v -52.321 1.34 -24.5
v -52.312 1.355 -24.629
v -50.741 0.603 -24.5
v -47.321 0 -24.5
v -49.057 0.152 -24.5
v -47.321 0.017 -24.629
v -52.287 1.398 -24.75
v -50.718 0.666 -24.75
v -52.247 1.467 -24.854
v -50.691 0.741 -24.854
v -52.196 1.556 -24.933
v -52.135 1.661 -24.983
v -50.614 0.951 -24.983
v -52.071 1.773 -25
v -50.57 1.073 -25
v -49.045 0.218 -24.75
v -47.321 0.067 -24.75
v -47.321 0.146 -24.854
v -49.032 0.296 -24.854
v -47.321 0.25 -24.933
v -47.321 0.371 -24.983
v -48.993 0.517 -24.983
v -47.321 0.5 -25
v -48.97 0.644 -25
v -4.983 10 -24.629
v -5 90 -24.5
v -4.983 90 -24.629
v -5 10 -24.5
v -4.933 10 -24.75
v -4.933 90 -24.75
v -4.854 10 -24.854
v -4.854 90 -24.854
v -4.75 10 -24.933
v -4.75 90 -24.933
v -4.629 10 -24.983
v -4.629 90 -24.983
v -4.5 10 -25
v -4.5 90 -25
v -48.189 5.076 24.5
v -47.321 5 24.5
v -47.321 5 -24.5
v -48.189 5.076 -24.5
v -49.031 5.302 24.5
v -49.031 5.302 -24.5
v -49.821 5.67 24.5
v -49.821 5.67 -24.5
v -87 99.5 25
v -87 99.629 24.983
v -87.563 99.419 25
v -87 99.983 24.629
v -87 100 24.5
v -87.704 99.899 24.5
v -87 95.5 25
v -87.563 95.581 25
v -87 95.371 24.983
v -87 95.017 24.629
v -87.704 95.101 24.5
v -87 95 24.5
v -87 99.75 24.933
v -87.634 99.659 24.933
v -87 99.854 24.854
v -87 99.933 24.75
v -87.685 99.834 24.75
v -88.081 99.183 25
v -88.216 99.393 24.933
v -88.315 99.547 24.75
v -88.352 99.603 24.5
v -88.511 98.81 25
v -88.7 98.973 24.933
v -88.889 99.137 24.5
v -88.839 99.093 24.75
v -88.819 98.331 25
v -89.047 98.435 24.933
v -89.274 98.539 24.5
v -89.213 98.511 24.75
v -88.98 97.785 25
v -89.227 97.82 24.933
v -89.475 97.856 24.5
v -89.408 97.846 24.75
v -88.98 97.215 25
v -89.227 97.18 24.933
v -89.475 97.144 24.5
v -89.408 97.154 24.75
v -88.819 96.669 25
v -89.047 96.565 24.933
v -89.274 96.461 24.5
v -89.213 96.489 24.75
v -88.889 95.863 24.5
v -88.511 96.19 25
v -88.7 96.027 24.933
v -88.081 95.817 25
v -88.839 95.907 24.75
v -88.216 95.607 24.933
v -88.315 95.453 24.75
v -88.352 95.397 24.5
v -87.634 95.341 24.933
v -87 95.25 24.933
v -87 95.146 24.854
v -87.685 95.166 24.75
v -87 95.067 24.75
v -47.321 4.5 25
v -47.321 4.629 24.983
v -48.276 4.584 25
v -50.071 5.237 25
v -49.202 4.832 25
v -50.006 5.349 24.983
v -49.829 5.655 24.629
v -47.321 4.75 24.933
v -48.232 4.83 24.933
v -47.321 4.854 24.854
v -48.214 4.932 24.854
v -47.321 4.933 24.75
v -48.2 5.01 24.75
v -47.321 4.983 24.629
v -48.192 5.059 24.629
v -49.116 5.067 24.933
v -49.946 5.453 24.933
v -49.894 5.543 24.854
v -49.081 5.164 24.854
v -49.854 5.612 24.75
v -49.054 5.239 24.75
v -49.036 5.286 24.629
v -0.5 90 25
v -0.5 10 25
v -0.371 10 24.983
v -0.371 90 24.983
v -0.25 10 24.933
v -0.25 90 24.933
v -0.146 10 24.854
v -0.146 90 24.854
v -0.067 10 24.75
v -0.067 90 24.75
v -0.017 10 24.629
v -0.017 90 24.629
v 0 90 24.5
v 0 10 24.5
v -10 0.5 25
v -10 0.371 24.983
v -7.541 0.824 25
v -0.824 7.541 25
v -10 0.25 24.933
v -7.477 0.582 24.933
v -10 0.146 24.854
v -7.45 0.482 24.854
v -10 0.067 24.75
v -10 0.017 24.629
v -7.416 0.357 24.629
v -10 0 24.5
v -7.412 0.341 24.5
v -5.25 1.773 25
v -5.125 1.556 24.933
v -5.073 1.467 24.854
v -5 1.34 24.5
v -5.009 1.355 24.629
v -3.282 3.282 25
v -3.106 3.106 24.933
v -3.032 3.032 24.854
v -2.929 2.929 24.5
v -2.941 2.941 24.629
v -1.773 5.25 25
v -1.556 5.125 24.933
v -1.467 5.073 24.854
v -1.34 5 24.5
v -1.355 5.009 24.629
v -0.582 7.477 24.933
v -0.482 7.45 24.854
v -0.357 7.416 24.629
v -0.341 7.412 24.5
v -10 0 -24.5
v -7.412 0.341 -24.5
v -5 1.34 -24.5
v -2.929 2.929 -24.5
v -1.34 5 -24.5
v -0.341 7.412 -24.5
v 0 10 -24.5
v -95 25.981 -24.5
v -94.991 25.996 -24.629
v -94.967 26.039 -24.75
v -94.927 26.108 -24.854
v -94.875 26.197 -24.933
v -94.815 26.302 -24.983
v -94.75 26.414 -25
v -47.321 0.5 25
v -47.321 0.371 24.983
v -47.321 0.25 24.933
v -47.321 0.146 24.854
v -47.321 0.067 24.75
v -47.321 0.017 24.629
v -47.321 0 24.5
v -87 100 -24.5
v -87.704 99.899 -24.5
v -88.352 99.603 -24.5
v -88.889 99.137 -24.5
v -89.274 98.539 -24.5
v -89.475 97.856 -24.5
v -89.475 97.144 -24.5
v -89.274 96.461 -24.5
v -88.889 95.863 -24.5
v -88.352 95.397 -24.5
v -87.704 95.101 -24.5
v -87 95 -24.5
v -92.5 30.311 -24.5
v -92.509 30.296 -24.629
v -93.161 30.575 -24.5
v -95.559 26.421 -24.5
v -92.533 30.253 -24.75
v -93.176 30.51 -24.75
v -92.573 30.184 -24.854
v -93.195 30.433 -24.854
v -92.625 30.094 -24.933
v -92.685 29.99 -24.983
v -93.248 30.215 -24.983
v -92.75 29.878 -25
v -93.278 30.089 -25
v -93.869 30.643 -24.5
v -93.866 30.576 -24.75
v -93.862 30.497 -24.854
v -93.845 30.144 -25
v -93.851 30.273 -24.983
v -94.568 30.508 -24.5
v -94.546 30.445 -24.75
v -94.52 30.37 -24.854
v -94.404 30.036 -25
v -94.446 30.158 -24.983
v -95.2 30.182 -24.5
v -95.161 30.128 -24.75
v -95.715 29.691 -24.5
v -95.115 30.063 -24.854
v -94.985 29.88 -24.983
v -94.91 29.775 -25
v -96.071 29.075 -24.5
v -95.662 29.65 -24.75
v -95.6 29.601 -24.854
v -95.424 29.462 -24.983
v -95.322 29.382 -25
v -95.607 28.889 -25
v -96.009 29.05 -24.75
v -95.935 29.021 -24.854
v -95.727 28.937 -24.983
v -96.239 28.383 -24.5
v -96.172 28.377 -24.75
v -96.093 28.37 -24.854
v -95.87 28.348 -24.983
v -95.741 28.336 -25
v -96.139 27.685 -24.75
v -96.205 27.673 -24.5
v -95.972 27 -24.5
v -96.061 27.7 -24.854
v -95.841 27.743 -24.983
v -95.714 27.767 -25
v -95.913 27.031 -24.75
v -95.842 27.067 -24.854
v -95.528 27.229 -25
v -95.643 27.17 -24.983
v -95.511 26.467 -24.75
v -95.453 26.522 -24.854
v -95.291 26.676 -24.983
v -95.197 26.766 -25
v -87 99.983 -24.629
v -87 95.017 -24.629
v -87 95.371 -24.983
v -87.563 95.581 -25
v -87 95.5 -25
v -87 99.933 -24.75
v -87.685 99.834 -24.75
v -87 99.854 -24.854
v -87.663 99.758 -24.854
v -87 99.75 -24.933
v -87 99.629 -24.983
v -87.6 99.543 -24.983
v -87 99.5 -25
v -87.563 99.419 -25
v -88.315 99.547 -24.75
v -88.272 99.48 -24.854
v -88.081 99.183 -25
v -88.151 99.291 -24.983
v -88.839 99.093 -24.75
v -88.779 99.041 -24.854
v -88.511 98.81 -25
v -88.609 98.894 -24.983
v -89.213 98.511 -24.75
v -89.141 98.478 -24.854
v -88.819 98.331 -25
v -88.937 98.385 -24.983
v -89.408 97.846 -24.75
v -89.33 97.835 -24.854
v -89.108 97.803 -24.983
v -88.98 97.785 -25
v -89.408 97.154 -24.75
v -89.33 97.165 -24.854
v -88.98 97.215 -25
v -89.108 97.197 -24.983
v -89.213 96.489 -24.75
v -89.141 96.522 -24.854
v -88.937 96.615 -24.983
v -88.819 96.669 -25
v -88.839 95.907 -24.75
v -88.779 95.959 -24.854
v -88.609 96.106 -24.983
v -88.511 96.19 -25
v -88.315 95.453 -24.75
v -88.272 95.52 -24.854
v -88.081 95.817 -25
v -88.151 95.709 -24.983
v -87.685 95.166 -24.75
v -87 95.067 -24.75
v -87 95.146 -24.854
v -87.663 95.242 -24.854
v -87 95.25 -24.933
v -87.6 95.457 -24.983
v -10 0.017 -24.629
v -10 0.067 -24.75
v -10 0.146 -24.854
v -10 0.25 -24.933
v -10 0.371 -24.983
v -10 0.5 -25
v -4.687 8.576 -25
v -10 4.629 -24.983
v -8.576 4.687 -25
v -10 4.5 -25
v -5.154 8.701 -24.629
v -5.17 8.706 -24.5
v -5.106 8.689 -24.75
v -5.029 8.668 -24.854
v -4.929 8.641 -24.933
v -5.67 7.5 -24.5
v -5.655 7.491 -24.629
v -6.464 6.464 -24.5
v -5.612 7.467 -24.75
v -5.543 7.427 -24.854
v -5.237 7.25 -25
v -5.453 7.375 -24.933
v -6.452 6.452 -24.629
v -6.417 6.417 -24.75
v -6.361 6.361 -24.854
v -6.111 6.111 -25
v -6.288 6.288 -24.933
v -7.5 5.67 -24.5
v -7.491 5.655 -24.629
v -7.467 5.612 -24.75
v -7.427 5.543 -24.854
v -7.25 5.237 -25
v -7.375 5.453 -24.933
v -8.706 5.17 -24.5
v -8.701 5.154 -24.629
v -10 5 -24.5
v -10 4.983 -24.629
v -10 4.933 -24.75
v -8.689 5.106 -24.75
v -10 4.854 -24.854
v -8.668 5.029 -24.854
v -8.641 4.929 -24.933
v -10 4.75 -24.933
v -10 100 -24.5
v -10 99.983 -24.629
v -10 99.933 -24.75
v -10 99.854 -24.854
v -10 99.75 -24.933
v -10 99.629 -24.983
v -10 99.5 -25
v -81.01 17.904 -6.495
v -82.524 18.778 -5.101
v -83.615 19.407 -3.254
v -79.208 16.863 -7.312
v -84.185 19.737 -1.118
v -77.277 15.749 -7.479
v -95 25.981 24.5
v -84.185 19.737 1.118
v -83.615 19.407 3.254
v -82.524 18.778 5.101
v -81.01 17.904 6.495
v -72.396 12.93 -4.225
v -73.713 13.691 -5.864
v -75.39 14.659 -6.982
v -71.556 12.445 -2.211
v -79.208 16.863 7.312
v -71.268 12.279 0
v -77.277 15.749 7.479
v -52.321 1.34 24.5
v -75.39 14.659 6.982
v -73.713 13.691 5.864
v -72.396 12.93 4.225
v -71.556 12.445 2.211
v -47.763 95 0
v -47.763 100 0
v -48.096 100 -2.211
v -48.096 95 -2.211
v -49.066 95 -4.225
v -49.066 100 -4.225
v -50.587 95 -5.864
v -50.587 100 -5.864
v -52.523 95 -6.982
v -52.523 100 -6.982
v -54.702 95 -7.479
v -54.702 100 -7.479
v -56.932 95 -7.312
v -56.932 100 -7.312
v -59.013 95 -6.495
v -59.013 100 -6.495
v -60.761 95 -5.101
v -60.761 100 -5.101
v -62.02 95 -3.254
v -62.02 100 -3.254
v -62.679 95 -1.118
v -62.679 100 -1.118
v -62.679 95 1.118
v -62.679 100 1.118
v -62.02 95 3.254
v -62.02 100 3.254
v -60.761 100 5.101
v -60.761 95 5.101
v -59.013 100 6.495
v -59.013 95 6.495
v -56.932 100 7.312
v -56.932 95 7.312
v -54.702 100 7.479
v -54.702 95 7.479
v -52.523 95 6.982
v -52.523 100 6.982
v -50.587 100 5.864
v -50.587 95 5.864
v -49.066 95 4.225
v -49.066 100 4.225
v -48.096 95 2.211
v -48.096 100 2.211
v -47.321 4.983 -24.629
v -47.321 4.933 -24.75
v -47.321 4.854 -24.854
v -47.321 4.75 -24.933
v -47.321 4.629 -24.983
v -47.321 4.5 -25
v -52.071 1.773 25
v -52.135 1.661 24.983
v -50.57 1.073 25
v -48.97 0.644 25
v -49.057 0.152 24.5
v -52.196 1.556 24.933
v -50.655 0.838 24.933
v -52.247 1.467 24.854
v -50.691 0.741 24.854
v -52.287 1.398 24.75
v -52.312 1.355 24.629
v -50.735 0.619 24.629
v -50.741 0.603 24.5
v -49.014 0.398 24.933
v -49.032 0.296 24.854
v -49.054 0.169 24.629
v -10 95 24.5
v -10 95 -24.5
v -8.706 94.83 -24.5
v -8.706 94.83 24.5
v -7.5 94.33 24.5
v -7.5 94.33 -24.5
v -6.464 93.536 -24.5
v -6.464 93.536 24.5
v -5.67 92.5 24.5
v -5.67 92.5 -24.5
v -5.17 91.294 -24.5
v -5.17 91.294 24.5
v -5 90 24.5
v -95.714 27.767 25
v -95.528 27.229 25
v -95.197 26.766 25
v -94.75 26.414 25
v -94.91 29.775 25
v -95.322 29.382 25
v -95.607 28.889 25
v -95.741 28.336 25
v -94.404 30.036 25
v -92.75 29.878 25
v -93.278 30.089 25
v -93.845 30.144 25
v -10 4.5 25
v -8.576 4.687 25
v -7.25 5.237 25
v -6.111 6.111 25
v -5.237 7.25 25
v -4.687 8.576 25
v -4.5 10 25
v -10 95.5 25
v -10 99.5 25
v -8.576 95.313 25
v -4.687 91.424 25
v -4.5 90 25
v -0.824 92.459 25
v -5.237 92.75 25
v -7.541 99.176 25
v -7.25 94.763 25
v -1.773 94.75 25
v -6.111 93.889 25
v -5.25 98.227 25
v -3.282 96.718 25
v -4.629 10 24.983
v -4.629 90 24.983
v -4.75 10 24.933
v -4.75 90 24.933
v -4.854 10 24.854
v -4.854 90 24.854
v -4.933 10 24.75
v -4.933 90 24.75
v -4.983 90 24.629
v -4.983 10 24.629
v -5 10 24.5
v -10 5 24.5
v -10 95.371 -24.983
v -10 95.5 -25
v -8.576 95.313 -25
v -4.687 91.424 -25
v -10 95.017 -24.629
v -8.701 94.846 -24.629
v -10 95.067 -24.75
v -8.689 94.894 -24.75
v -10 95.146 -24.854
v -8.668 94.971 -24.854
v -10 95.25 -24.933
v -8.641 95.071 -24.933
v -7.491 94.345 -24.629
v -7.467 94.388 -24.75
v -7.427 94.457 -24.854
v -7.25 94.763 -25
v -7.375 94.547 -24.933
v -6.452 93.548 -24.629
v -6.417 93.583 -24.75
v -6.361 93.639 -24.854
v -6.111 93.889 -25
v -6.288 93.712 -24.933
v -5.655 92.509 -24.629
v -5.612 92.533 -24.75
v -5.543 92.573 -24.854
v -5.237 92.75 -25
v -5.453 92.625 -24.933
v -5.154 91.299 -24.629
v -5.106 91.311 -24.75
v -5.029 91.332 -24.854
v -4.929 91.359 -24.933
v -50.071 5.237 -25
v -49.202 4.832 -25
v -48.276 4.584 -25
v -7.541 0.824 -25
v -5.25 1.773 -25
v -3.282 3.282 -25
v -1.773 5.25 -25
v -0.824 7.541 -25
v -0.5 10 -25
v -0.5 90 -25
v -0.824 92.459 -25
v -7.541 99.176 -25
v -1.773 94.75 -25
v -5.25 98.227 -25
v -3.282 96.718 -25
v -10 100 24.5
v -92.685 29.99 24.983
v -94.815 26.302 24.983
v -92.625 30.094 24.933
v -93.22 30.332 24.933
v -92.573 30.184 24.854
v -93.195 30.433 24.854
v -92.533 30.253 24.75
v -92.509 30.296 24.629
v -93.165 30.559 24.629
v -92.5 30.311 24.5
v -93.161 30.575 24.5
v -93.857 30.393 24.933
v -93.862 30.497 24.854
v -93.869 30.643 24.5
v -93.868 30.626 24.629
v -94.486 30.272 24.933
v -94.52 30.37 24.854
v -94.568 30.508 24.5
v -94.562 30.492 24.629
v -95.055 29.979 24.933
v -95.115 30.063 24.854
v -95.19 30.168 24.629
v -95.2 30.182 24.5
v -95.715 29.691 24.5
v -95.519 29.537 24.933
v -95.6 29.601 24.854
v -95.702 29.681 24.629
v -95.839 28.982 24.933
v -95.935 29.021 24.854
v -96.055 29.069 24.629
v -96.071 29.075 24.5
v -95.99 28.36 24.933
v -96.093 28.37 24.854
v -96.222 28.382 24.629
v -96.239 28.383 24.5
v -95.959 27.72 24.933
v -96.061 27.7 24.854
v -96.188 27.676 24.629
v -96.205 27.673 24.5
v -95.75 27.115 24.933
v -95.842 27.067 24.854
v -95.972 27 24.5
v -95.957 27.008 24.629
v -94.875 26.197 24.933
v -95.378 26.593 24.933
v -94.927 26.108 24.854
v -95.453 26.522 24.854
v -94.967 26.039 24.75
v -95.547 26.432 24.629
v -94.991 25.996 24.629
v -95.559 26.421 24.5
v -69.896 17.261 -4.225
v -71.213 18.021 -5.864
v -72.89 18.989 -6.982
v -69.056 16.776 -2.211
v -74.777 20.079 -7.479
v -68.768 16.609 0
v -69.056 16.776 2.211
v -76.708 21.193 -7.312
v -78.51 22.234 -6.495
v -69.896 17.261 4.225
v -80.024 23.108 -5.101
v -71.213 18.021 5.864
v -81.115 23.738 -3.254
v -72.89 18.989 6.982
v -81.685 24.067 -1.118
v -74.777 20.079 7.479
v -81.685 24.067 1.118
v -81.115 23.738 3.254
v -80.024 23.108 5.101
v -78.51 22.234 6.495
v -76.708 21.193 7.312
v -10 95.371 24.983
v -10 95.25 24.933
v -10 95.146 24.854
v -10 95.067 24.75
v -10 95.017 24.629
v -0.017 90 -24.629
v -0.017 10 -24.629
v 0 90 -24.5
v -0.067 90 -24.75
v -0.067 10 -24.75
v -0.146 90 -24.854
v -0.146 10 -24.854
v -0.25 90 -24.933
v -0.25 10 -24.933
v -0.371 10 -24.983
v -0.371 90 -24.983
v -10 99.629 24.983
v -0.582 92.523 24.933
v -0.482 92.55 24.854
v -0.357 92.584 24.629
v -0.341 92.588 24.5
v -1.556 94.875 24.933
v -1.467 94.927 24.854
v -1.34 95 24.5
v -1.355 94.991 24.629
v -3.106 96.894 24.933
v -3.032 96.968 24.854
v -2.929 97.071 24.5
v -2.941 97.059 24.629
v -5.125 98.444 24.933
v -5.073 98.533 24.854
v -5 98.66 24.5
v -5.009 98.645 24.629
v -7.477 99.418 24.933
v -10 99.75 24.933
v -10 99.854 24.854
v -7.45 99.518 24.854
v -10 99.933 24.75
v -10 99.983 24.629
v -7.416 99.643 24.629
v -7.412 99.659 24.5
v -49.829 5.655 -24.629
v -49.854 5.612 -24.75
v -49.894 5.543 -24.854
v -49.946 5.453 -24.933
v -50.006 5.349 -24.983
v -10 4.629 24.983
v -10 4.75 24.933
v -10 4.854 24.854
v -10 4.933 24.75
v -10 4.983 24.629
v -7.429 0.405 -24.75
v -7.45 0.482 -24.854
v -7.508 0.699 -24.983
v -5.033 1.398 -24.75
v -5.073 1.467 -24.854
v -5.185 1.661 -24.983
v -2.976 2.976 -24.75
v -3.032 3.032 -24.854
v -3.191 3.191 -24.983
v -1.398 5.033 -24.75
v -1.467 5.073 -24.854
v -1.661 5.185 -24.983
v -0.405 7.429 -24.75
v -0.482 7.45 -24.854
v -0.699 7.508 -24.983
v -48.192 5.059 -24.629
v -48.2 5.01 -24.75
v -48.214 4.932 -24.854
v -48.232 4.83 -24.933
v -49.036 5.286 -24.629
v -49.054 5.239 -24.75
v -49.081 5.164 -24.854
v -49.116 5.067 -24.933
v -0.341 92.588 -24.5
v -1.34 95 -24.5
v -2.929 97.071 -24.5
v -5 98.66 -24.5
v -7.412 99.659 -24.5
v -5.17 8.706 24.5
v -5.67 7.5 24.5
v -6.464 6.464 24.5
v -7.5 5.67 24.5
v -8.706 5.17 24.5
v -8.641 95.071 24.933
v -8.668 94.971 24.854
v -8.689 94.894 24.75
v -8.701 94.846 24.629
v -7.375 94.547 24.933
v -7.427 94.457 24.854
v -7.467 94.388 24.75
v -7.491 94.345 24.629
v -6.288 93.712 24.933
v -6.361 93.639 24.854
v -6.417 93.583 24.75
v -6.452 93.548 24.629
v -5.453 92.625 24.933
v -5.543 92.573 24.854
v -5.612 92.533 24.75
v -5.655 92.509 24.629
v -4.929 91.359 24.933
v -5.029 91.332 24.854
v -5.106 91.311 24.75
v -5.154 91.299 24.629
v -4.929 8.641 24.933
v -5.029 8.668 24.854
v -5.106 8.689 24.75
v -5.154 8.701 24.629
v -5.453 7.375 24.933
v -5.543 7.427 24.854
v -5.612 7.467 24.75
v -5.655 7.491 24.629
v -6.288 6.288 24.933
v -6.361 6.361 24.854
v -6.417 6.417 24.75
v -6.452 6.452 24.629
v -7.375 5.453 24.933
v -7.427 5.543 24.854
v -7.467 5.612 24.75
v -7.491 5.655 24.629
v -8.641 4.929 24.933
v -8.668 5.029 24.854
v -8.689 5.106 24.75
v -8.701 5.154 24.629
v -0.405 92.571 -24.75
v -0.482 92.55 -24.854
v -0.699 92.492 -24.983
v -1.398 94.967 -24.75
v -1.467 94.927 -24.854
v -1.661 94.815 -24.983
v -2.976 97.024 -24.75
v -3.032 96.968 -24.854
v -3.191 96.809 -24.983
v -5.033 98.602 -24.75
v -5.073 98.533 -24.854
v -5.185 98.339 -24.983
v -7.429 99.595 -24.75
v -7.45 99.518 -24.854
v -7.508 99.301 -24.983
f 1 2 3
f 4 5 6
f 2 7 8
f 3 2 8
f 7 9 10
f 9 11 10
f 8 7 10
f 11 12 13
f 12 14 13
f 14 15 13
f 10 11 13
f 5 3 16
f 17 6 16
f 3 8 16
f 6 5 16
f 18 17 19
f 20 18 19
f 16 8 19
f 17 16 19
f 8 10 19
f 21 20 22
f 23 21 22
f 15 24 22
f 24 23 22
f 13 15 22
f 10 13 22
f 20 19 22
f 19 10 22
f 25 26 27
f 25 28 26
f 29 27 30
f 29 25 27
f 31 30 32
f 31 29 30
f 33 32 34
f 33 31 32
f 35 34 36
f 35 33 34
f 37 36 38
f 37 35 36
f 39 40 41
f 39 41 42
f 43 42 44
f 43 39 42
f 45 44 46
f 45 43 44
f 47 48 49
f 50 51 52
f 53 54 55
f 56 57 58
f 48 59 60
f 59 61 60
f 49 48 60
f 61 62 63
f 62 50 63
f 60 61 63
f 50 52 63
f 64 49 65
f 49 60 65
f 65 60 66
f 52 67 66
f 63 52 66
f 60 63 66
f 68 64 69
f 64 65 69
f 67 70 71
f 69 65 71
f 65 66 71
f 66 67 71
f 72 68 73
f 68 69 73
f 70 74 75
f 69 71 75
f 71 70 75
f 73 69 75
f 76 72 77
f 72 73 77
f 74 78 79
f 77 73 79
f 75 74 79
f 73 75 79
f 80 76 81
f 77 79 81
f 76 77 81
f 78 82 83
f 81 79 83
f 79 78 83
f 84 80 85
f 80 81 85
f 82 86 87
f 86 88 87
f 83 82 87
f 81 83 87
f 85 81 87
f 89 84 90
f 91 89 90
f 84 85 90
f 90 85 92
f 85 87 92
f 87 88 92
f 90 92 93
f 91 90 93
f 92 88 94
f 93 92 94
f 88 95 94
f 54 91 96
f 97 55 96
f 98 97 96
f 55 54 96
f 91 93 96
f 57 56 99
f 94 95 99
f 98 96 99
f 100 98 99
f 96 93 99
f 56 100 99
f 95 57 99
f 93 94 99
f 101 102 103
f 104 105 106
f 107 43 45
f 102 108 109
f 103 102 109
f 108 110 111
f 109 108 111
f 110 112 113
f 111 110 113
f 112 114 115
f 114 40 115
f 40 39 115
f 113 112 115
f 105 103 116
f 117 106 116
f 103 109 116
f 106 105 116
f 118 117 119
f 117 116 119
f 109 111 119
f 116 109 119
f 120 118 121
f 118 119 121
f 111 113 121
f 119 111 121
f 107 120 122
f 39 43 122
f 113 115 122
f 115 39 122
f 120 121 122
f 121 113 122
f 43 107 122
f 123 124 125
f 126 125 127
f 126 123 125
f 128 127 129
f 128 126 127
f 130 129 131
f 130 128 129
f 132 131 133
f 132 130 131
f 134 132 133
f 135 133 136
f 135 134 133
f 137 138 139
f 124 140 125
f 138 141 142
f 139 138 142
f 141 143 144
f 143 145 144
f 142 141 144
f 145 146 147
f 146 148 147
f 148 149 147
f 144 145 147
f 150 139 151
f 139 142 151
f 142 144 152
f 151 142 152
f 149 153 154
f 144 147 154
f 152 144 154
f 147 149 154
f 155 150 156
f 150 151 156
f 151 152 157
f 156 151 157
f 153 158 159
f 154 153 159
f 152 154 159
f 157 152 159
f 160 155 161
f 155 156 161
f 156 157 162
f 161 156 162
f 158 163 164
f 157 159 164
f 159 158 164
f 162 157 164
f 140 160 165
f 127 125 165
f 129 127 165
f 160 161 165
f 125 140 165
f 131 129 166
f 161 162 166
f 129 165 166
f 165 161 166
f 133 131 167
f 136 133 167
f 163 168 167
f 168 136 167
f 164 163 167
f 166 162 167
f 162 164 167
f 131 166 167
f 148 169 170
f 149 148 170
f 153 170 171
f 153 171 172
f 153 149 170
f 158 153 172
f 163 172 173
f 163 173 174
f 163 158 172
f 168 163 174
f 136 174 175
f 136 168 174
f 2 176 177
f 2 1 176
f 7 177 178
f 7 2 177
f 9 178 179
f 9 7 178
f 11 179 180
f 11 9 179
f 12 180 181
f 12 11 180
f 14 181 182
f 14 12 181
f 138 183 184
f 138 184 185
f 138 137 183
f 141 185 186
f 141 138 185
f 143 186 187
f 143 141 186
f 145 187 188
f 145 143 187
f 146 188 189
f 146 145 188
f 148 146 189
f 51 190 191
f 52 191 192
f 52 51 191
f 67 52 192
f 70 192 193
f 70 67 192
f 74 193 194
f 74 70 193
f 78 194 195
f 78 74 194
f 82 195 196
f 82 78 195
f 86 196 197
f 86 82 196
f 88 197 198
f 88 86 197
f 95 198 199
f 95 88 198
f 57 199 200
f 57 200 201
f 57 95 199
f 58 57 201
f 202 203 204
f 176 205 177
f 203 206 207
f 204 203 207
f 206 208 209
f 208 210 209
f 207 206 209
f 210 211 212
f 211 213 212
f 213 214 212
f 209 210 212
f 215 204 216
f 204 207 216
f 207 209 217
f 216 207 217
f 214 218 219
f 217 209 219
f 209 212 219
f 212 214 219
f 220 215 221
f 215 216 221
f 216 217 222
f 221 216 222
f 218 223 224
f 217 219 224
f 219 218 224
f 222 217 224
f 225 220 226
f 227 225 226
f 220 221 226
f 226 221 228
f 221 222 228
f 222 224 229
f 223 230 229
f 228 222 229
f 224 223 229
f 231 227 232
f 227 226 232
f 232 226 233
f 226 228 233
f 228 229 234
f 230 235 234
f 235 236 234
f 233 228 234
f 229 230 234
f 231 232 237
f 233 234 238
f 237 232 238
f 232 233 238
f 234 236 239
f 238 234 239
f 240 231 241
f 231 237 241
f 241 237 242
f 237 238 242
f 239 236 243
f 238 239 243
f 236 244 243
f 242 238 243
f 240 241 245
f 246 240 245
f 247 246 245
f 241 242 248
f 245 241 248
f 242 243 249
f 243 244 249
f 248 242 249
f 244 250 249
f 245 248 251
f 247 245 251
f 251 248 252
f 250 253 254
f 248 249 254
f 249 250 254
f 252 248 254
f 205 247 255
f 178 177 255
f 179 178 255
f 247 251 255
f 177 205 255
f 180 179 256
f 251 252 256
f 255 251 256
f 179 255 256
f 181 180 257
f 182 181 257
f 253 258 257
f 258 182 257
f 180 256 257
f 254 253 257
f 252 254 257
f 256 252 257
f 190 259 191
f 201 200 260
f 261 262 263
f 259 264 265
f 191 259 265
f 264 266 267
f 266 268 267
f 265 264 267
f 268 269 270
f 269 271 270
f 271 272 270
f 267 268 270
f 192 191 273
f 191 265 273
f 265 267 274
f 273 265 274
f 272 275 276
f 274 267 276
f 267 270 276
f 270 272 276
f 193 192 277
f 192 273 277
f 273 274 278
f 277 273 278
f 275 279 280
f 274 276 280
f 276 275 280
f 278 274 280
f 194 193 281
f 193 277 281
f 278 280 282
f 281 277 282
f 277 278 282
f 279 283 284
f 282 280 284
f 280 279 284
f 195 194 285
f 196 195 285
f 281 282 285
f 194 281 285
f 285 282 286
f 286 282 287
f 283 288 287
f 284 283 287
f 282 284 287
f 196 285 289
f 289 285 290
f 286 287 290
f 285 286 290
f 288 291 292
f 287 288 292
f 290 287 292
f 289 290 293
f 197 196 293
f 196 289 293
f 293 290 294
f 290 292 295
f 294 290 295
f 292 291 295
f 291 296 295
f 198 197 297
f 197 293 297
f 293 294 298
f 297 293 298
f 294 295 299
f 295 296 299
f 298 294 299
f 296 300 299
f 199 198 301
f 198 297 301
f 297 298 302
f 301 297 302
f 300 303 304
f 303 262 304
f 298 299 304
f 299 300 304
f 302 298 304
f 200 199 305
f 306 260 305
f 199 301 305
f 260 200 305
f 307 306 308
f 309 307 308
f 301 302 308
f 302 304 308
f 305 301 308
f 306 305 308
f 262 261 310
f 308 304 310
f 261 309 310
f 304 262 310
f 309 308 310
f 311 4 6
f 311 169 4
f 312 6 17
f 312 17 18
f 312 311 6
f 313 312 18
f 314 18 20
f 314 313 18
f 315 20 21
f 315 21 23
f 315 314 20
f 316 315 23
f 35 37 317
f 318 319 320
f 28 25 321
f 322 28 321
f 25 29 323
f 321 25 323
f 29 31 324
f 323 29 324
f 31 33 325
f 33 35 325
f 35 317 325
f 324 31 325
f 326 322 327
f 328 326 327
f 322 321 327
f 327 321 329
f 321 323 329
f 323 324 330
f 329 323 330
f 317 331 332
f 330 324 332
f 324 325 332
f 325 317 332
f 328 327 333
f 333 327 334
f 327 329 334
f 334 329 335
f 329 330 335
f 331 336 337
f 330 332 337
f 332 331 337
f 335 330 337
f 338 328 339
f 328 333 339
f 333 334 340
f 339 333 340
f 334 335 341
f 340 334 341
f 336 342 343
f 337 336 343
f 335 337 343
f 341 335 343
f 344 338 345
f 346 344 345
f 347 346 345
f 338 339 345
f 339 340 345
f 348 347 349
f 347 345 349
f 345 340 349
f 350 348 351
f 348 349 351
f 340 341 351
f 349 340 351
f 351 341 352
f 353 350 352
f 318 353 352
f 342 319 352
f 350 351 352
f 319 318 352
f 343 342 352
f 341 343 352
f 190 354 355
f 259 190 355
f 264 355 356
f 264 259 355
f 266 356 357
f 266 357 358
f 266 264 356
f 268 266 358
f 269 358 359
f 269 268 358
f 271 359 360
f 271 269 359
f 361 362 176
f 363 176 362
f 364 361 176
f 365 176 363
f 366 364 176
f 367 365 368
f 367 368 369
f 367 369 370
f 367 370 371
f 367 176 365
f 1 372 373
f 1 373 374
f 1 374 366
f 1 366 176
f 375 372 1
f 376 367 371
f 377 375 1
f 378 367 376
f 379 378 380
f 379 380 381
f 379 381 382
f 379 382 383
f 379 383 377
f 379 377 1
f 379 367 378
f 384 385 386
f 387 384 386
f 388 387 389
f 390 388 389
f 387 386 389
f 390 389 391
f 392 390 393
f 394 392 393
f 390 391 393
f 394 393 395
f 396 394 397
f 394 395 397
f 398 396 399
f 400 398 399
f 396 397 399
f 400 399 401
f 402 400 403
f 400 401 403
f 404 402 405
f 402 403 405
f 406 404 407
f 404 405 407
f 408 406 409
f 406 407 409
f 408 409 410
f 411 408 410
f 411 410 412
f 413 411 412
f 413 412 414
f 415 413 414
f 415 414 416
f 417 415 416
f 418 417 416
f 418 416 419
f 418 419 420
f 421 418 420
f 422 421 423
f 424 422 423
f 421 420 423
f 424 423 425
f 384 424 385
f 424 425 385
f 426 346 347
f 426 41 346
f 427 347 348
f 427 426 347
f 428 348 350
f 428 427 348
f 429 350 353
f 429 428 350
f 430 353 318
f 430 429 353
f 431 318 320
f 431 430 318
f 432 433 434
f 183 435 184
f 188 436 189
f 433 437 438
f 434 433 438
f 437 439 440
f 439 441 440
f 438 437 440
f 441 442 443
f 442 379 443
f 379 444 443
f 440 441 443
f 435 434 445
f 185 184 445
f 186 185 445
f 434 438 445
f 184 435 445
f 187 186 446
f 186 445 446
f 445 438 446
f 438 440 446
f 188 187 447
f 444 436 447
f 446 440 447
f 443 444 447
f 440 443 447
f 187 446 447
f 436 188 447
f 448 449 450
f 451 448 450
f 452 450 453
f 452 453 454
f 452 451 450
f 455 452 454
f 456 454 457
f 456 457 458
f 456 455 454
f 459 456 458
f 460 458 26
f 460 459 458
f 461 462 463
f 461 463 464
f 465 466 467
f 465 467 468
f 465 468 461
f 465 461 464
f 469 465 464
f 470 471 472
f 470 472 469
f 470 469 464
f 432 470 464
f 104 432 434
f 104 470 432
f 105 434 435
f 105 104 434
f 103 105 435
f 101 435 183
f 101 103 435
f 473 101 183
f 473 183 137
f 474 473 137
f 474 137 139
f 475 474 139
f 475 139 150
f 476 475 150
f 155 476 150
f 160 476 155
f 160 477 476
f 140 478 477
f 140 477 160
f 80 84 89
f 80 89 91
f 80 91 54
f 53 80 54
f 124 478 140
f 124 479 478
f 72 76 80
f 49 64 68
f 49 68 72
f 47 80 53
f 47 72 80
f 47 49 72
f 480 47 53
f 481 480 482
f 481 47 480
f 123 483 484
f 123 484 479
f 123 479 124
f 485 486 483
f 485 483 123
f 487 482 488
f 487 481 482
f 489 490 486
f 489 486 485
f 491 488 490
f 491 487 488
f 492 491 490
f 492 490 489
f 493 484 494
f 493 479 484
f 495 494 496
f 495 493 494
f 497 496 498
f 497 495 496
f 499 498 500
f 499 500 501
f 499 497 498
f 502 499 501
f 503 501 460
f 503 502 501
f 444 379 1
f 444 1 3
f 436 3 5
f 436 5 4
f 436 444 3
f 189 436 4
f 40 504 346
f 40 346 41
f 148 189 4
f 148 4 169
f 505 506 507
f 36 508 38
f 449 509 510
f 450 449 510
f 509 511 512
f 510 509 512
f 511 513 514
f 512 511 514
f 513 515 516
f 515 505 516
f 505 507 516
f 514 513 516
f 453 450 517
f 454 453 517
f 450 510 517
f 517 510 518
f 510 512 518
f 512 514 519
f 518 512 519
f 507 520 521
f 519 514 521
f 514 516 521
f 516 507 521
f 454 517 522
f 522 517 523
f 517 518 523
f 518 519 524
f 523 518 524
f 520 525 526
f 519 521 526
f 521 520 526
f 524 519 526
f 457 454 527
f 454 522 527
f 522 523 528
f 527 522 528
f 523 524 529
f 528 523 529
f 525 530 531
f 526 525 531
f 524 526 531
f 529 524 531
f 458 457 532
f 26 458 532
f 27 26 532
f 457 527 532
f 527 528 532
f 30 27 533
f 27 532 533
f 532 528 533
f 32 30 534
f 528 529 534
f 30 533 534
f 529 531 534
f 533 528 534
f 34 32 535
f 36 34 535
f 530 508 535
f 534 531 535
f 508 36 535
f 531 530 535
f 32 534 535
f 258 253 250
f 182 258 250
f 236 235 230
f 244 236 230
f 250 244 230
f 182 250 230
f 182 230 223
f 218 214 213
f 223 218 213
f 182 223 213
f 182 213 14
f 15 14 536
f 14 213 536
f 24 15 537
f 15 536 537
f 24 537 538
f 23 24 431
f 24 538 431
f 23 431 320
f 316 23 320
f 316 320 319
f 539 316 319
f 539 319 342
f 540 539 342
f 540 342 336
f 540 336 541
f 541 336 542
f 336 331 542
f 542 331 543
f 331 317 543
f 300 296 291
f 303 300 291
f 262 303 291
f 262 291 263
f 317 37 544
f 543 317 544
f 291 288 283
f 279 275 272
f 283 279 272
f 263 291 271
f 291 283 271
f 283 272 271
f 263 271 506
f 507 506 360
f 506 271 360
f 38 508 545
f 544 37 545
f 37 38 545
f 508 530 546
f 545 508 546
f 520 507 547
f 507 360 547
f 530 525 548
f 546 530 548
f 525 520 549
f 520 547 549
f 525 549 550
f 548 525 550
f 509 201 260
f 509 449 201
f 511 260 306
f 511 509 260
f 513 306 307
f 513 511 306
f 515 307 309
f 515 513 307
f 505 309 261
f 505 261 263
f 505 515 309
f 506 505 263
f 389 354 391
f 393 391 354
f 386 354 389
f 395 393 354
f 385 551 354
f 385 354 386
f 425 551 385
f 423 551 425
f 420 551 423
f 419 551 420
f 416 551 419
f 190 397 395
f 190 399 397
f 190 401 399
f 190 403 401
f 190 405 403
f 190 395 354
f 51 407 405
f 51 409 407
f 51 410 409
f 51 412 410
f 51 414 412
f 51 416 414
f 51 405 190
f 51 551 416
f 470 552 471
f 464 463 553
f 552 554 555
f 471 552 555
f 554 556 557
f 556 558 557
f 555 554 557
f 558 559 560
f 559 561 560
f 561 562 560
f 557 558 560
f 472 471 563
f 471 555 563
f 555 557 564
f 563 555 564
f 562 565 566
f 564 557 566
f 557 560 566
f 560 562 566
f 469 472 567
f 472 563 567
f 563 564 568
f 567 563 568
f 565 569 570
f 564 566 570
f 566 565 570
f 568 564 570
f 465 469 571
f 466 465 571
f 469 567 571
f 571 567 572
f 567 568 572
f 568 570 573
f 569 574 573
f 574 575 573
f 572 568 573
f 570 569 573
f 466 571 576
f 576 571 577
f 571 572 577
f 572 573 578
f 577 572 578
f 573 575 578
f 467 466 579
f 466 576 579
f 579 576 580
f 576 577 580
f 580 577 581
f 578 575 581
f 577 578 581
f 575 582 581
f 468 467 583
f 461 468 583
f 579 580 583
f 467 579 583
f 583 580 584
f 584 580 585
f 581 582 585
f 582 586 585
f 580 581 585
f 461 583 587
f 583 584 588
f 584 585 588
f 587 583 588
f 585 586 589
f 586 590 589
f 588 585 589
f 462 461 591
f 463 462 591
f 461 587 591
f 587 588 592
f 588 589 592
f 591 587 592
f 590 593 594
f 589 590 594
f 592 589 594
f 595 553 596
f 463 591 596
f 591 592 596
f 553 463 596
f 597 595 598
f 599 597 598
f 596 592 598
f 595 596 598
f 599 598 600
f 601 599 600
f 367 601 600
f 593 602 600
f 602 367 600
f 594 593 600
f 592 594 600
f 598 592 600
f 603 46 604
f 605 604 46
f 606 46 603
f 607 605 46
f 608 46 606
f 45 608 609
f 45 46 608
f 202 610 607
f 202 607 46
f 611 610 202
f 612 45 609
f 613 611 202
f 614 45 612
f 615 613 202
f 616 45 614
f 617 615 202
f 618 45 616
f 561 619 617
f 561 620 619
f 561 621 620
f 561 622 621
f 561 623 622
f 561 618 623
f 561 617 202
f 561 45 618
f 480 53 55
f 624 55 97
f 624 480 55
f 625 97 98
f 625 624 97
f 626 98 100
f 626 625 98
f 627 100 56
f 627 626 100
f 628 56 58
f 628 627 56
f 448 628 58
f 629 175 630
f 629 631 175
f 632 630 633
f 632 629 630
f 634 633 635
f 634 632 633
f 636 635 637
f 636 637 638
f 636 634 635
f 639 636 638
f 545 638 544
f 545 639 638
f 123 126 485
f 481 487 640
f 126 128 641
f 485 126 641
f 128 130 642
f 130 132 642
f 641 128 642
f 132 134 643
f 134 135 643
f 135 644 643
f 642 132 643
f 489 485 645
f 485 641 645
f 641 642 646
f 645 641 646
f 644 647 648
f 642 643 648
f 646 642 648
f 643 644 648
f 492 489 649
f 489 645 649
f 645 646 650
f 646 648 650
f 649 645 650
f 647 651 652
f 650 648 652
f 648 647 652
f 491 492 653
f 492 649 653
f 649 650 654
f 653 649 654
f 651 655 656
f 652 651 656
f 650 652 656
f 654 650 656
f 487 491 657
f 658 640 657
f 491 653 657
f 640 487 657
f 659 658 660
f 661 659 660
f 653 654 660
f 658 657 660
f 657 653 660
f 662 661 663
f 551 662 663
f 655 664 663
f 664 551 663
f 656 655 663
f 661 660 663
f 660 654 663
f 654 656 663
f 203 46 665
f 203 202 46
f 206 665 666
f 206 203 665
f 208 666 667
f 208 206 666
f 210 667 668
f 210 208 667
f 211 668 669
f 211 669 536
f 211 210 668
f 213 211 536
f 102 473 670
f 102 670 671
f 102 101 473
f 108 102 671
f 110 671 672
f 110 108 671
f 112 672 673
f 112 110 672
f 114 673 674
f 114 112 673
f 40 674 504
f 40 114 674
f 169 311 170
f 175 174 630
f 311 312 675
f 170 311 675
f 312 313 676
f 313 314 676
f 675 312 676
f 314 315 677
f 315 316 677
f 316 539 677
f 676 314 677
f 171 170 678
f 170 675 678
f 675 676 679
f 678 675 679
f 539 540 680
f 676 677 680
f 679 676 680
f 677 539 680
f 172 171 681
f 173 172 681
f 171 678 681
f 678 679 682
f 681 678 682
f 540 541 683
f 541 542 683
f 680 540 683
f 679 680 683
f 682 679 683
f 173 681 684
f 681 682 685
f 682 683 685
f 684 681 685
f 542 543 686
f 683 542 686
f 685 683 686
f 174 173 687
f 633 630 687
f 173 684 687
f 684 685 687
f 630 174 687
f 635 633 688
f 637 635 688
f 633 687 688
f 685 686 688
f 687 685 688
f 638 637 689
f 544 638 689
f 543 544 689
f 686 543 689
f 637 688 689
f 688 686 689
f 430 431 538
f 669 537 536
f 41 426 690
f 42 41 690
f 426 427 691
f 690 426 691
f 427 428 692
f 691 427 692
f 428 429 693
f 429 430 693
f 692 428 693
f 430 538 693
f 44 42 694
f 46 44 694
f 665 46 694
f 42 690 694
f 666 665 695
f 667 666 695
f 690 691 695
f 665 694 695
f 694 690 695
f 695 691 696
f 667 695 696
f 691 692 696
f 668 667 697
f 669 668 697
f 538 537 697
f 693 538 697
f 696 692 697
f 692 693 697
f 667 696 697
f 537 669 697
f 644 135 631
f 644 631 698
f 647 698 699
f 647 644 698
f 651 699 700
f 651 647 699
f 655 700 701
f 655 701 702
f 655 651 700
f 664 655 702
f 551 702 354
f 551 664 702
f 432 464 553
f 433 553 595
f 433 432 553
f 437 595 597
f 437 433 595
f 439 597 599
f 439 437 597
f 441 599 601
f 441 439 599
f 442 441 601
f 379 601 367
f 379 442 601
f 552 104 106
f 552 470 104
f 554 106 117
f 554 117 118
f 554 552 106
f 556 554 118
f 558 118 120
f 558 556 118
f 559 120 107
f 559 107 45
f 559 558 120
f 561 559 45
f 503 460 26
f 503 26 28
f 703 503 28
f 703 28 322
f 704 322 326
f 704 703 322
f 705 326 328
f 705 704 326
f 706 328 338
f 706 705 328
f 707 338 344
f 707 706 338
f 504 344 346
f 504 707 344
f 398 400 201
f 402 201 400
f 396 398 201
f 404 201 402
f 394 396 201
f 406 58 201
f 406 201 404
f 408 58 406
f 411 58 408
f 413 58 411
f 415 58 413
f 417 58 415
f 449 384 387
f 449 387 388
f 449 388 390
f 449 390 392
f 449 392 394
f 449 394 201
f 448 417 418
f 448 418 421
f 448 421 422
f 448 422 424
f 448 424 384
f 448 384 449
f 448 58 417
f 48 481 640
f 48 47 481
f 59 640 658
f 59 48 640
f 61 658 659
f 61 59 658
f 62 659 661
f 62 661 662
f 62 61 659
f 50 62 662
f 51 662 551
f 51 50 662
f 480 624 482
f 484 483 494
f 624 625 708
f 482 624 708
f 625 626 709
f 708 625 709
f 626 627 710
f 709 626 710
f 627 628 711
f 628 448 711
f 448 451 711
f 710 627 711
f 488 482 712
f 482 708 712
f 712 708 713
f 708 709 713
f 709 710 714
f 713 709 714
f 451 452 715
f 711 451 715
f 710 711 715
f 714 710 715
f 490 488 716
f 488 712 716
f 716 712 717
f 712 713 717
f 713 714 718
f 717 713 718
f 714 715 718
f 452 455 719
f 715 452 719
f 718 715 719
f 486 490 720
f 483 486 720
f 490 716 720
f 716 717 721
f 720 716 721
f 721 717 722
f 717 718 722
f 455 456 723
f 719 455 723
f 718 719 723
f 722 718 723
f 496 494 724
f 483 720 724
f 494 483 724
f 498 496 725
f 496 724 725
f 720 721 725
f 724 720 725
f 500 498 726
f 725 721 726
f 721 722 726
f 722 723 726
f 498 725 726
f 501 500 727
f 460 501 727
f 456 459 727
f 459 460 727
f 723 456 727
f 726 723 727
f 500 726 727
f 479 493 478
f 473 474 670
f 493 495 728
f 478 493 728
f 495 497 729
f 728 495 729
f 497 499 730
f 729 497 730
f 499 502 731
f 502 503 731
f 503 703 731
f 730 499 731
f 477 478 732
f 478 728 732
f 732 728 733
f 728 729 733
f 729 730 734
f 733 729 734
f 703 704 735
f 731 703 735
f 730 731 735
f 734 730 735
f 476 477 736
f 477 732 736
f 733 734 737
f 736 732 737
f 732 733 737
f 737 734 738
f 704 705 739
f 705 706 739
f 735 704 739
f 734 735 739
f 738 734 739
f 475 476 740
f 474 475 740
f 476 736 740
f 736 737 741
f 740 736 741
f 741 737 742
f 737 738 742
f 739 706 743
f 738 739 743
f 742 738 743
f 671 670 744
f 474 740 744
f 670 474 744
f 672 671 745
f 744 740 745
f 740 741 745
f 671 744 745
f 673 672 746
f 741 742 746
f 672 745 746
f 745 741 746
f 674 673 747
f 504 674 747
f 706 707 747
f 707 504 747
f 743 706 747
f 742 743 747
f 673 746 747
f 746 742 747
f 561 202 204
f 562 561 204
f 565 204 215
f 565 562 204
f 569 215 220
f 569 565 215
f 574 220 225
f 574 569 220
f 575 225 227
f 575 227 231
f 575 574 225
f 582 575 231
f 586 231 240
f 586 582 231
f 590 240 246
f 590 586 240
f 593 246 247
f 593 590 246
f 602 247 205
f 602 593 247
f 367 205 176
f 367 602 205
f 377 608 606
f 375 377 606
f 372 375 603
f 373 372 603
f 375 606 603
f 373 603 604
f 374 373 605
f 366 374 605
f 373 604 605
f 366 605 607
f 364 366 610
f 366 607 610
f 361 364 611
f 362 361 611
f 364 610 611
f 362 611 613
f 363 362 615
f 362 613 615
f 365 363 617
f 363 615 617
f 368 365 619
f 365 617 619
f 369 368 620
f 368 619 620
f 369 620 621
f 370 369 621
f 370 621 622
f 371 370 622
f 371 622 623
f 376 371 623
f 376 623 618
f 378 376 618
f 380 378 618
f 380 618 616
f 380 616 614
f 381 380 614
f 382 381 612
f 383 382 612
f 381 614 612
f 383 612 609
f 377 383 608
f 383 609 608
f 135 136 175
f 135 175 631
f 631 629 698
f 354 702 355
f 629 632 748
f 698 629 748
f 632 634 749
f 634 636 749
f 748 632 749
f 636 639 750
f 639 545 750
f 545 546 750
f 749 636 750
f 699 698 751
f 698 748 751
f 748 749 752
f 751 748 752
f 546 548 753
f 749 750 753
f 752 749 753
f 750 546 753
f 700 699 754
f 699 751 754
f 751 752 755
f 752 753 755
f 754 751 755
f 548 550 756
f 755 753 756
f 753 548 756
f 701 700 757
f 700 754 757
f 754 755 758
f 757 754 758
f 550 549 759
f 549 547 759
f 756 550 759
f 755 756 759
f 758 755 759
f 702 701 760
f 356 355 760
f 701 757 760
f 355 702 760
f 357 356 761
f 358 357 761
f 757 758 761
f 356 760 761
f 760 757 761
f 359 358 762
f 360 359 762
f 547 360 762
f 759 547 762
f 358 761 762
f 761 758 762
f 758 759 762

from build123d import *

# Parameters (mm, degrees)
EXTRUDE_1_DEPTH     = 25
SKETCH_3_R          = 7.5
CUT_EXTRUDE_1_DEPTH = 5
SKETCH_5_R          = 7.5
CUT_EXTRUDE_2_DEPTH = 5
FILLET_1_R          = 0.5


with BuildPart() as part:
    # 草图1 → 凸台-拉伸1 (new body, symmetric)
    with BuildSketch(Plane.XY):
        with BuildLine():
            Line((0, 10), (0, 90))
            ThreePointArc((0, 90), (-2.928932188, 97.071067812), (-10, 100))
            Line((-10, 100), (-87, 100))
            ThreePointArc((-87, 100), (-89.5, 97.5), (-87, 95))
            Line((-87, 95), (-10, 95))
            ThreePointArc((-10, 95), (-6.464466094, 93.535533906), (-5, 90))
            Line((-5, 90), (-5, 10))
            ThreePointArc((-5, 10), (-6.464466094, 6.464466094), (-10, 5))
            Line((-10, 5), (-47.320508076, 5))
            ThreePointArc((-47.320508076, 5), (-48.614603301, 5.170370869), (-49.820508076, 5.669872981))
            Line((-49.820508076, 5.669872981), (-92.5, 30.310889132))
            ThreePointArc((-92.5, 30.310889132), (-95.915063509, 29.395825623), (-95, 25.980762114))
            Line((-95, 25.980762114), (-52.320508076, 1.339745962))
            ThreePointArc((-52.320508076, 1.339745962), (-49.908698527, 0.340741737), (-47.320508076, 0))
            Line((-47.320508076, 0), (-10, 0))
            ThreePointArc((-10, 0), (-2.928932188, 2.928932188), (0, 10))
        make_face()
    extrude(amount=EXTRUDE_1_DEPTH, both=True)

    # 草图3 → 切除-拉伸1 (cut)
    with BuildSketch(Plane(origin=(-10, -17.320508076, 0), x_dir=(0.866025404, -0.5, 0), z_dir=(0.5, 0.866025404, 0))):
        with Locations((-75.358983849, 0)):
            Circle(SKETCH_3_R)
    extrude(amount=-CUT_EXTRUDE_1_DEPTH, mode=Mode.SUBTRACT)

    # 草图5 → 切除-拉伸2 (cut)
    with BuildSketch(Plane(origin=(0, 100, 0), x_dir=(1, 0, 0), z_dir=(0, 1, 0))):
        with Locations((-55.262794416, 0)):
            Circle(SKETCH_5_R)
    extrude(amount=-CUT_EXTRUDE_2_DEPTH, mode=Mode.SUBTRACT)

    # 圆角1
    fillet_1_edges = [part.edges().sort_by_distance(p)[0] for p in [
        (-89.5, 97.5, 25),
        (0, 50, -25),
        (-2.928932188, 2.928932188, -25),
        (-28.660254038, 0, -25),
        (-48.5, 95, 25),
        (-49.908698527, 0.340741737, -25),
        (-73.660254038, 13.660254038, -25),
        (-95.915063509, 29.395825623, -25),
        (-71.160254038, 17.990381057, -25),
        (-48.614603301, 5.170370869, -25),
        (-28.660254038, 5, -25),
        (-6.464466094, 6.464466094, -25),
        (-5, 50, -25),
        (-6.464466094, 93.535533906, -25),
        (-48.5, 95, -25),
        (-6.464466094, 93.535533906, 25),
        (-89.5, 97.5, -25),
        (-48.5, 100, -25),
        (-2.928932188, 97.071067812, -25),
        (-5, 50, 25),
        (-6.464466094, 6.464466094, 25),
        (-28.660254038, 5, 25),
        (-48.614603301, 5.170370869, 25),
        (-71.160254038, 17.990381057, 25),
        (-95.915063509, 29.395825623, 25),
        (-73.660254038, 13.660254038, 25),
        (-2.928932188, 97.071067812, 25),
        (-49.908698527, 0.340741737, 25),
        (-28.660254038, 0, 25),
        (-2.928932188, 2.928932188, 25),
        (0, 50, 25),
        (-48.5, 100, 25),
    ]]
    fillet(fillet_1_edges, radius=FILLET_1_R)


solid = part.part
